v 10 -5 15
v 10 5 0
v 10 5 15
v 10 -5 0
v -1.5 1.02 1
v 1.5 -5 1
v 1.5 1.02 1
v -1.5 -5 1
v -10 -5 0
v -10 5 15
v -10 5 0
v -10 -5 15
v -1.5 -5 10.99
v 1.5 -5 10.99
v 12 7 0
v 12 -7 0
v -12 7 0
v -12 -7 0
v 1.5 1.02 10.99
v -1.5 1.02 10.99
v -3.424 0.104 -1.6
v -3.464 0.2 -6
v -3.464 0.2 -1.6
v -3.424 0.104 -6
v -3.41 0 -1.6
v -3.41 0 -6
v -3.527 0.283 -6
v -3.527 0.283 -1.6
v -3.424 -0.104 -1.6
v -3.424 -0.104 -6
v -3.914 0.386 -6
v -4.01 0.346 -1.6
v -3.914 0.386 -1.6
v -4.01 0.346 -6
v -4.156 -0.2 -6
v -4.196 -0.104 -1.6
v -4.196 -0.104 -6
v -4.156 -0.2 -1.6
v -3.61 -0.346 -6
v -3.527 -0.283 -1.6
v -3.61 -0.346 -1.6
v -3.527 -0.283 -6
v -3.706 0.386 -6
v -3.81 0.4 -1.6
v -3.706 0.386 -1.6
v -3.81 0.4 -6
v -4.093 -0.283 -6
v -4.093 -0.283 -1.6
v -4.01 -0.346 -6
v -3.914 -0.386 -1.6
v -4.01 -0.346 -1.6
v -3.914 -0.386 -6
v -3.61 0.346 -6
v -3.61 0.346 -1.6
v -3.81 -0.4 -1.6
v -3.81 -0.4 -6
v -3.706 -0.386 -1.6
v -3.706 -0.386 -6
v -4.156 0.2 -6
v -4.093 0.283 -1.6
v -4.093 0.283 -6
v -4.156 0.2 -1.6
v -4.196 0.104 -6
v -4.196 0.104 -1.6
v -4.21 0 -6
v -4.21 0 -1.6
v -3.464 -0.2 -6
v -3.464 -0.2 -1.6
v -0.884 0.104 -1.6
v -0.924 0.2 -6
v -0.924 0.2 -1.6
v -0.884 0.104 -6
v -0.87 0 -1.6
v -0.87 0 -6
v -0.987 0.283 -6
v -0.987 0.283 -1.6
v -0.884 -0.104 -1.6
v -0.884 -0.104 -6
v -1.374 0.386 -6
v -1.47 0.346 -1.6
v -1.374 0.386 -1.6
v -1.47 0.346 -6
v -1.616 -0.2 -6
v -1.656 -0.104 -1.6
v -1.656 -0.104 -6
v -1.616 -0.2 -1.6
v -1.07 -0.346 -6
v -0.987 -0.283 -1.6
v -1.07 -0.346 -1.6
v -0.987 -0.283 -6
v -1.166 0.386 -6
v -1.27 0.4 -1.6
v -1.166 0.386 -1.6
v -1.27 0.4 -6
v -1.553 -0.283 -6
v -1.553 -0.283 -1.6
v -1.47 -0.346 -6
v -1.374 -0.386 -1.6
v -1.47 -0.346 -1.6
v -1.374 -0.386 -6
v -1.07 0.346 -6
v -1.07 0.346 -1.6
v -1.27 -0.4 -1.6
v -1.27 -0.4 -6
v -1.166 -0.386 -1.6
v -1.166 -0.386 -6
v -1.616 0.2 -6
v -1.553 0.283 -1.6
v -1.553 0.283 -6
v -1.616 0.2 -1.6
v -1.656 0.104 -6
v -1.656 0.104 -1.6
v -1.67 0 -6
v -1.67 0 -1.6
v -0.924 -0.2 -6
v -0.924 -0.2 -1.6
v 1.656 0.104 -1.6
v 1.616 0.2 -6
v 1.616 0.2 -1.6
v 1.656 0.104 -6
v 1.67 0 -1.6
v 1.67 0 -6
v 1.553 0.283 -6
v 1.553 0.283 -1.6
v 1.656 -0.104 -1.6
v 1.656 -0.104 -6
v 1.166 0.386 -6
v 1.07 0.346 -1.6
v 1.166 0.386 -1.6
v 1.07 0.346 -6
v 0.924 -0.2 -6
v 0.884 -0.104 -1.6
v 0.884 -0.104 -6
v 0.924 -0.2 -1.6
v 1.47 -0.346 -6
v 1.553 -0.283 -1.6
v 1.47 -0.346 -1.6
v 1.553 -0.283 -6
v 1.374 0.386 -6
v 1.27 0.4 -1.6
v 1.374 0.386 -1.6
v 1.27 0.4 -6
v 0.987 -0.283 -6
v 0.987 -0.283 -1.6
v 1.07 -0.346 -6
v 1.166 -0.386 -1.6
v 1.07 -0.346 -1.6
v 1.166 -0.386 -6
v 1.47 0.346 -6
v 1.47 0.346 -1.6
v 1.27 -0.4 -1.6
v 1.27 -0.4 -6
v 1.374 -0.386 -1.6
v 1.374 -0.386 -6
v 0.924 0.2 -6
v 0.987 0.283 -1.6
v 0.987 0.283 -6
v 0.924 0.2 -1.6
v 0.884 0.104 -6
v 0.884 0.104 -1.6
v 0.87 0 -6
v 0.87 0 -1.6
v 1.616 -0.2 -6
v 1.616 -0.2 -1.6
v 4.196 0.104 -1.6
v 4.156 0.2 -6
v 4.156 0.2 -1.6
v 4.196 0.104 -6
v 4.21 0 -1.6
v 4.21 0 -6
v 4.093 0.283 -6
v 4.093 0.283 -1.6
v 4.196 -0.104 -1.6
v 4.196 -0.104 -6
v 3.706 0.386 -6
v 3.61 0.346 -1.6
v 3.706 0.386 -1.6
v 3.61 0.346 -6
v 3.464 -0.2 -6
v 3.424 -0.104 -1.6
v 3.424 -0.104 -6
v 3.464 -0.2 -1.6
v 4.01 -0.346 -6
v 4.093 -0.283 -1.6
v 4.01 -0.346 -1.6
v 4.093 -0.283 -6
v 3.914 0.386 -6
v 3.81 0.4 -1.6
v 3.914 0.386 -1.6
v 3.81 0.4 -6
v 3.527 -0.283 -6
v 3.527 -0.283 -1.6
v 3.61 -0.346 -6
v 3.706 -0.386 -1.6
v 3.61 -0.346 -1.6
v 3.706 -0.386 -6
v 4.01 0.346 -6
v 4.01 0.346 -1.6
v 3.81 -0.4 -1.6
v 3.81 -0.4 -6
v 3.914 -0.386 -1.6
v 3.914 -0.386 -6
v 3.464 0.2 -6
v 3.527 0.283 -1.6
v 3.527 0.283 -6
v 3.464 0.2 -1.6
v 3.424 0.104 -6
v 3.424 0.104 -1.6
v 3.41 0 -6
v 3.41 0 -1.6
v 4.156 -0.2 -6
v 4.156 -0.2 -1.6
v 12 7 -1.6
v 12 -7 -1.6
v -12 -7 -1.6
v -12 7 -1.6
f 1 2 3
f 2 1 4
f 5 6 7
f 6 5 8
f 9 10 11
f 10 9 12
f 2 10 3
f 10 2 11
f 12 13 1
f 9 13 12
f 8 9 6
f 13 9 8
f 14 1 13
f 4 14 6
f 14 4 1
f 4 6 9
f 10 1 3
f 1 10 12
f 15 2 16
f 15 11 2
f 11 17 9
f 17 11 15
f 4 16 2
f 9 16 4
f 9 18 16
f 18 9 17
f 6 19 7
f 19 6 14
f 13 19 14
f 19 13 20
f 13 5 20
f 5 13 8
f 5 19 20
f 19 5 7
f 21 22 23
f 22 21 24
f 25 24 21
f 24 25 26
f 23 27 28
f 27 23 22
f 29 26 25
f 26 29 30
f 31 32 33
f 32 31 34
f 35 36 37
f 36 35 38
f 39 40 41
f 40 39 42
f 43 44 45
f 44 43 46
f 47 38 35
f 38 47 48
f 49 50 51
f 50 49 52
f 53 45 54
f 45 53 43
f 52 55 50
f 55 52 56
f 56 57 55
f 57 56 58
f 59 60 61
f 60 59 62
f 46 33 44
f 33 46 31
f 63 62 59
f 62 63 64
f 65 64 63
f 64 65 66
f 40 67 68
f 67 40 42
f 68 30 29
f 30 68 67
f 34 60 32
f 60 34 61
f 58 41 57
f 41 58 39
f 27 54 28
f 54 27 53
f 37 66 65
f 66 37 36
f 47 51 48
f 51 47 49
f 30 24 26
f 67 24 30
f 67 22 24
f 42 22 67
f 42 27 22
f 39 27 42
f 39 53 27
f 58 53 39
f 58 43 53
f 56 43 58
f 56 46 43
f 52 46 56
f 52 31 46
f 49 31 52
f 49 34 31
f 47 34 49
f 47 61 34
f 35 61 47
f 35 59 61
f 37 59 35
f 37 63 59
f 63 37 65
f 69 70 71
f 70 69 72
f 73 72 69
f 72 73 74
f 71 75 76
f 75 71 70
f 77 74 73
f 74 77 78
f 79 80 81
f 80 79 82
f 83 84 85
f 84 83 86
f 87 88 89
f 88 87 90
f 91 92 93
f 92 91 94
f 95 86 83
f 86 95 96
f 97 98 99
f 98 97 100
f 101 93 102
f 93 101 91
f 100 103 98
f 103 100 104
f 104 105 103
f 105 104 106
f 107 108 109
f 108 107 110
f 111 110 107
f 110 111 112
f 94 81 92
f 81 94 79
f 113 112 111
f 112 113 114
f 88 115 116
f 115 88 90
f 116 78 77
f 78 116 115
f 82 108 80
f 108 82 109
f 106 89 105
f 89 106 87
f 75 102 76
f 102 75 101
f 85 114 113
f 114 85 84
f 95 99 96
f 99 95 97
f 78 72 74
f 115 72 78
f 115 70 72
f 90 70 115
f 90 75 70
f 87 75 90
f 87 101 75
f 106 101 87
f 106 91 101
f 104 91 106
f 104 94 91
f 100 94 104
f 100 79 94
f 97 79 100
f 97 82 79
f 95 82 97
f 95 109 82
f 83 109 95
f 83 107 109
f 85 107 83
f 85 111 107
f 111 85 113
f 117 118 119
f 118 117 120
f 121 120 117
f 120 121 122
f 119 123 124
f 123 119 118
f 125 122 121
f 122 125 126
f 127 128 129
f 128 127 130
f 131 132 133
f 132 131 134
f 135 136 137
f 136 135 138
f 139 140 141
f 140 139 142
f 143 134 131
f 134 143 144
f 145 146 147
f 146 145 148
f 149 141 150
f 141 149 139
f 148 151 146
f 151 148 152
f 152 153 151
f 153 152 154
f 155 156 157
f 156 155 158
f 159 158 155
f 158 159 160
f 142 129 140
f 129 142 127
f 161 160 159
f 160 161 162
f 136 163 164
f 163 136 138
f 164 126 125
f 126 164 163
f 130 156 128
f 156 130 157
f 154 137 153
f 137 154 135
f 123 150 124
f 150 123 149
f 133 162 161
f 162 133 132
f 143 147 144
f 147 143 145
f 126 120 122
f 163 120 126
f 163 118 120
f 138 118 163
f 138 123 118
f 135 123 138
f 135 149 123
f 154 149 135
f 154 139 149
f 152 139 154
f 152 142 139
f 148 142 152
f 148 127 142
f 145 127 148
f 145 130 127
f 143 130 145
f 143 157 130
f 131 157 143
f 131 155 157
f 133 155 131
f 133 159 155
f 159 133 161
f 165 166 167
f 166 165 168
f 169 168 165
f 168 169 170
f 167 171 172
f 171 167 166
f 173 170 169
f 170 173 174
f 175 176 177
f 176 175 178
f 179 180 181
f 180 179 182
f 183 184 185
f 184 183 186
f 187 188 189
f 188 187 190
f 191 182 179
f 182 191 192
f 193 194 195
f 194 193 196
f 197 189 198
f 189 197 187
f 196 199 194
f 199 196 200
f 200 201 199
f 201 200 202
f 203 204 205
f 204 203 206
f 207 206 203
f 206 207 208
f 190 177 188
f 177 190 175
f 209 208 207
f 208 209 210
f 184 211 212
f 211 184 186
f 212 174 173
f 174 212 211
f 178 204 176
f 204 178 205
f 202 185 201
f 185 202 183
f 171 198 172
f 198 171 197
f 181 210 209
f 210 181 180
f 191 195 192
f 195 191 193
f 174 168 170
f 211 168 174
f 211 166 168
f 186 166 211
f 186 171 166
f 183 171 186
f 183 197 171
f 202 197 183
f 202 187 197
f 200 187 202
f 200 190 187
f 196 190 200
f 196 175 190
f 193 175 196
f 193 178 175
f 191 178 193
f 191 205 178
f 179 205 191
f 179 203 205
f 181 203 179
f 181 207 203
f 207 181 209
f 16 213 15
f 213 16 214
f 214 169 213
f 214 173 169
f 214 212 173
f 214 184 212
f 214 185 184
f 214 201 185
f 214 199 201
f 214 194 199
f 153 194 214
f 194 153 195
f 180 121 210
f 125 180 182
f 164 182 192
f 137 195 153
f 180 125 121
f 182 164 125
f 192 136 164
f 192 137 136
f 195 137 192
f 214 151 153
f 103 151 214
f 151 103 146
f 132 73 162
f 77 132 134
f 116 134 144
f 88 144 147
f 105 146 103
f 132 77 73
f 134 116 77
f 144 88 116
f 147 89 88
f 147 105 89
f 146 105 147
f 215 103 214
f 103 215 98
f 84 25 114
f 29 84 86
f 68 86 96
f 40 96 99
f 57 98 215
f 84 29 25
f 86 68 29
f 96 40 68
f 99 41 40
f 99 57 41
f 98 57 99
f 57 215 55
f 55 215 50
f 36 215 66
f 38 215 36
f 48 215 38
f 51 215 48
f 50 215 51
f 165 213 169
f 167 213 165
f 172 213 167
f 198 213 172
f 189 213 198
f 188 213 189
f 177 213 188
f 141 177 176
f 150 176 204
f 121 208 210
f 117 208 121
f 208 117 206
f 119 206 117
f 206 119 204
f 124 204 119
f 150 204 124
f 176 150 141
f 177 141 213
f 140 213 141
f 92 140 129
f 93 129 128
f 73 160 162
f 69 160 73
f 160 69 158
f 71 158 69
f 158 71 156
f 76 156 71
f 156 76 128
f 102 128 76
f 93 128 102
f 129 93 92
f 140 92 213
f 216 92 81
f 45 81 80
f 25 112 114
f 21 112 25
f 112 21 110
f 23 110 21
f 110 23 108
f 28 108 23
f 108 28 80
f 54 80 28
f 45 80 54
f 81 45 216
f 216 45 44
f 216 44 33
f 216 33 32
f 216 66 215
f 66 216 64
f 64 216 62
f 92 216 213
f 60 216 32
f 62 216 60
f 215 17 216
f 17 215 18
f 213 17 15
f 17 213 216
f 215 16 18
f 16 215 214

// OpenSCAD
// Photo interrupter (U-slot opto) - single connected solid with fork + pins + base/PCB
// STRUCTURAL FIXES:
// 1) Add missing "photo interrupter" fork body (already present) and ensure it is attached to base with overlap
// 2) Fix floating/disconnected pins: make pins start INSIDE the base (1-2mm) and extend downward
// 3) Ensure ALL parts are in one union() and overlap slightly for watertight connectivity

// Parameters
overall_width = 20; //[10:40:1]   // X
overall_depth = 10; //[5:20:1]    // Y
overall_height = 15; //[8:30:1]   // Z (body above base)
gap_width = 3; //[1.5:8:0.5]     // X opening (slot width between legs)
gap_depth = 6; //[3:20:1]         // Y slot depth (how far the slot goes into the body)
gap_height = 10; //[5:20:1]       // Z opening height (from bottom of body upward)
bridge_thickness = 2; //[1:6:0.5] // Z thickness of top bridge above slot
leg_thickness = 2; //[1:6:0.5]    // X thickness of each fork leg

base_thickness = 2; //[1:6:0.5]   // Z base
mount_hole_diameter = 2.5; //[1.5:6:0.1]
mount_hole_spacing = 10; //[6:20:1]

pcb_thickness = 1.6; //[0.8:3.2:0.1]
pcb_margin = 2; //[1:6:0.5]
pcb_enabled = 1; //[0:1:1]

pin_count = 4; //[2:6:1]
pin_d = 0.8; //[0.4:1.2:0.05]
pin_pitch = 2.54; //[1.27:5.08:0.01]
pin_len = 6; //[3:12:0.5]
pin_row_y = 0; // centered row

overlap = 1; //[0.5:2:0.1]

// Derived / safety clamps
eps = 0.01;

body_w = max(6, overall_width);
body_d = max(4, overall_depth);
body_h = max(6, overall_height);

base_w = body_w;
base_d = body_d;

slot_w = min(gap_width, max(eps, body_w - 2*leg_thickness - eps));
slot_d = min(gap_depth, max(eps, body_d - eps));
slot_h = min(gap_height, max(eps, body_h - bridge_thickness - eps));

leg_t = min(leg_thickness, max(eps, (body_w - slot_w)/2 - eps));
bridge_t = min(bridge_thickness, max(eps, body_h - slot_h - eps));

pin_r = pin_d/2;
pins_span = (pin_count-1)*pin_pitch;
pins_x0 = -pins_span/2;

// --- Z references (base centered at Z=0) ---
base_top_z =  base_thickness/2;
base_bot_z = -base_thickness/2;

// PCB placement: overlap into base so it is fused
pcb_center_z = base_bot_z - pcb_thickness/2 + overlap;

// Fork/body placement: overlap into base so it is fused
body_center_z = base_top_z + body_h/2 - overlap;

// Pins placement (CRITICAL FIX):
// Make the TOP of each pin sit INSIDE the base by 'overlap' (not merely touching).
// This guarantees the pins are physically attached to the base (and PCB if enabled).
pins_top_z    = base_bot_z + overlap;     // inside base by overlap (since base_bot_z is bottom face)
pins_center_z = pins_top_z - pin_len/2;   // so pin extends downward from inside base

module photo_interrupter() {
  union() {

    // PCB (optional) - fused to base with overlap
    if (pcb_enabled) {
      color([0.0, 0.4, 0.2])
      translate([0, 0, pcb_center_z])
        cube([base_w + 2*pcb_margin, base_d + 2*pcb_margin, pcb_thickness], center=true);
    }

    // Base plate with mounting holes
    color([0.15, 0.2, 0.35])
    difference() {
      cube([base_w, base_d, base_thickness], center=true);

      for (sx = [-1, 1])
        translate([sx*mount_hole_spacing/2, 0, 0])
          cylinder(h=base_thickness + 2*overlap, r=mount_hole_diameter/2, center=true, $fn=48);
    }

    // Photo interrupter body (U-shaped fork) with through-slot open at the front (Y-)
    // Attached to base with overlap
    color([0.15, 0.2, 0.35])
    translate([0, 0, body_center_z])
    difference() {
      // Outer body
      cube([body_w, body_d, body_h], center=true);

      // Slot: open from bottom up to slot_h, and open from front face into the body by slot_d
      translate([0,
                 -body_d/2 + slot_d/2 + eps,          // start at front face (Y-)
                 -body_h/2 + slot_h/2 - eps])         // start at bottom of body
        cube([slot_w, slot_d + 2*eps, slot_h + 2*overlap], center=true);
    }

    // Leads/pins - attached by embedding their top into the base by 'overlap'
    color([0.75, 0.75, 0.75])
    for (i = [0:pin_count-1]) {
      x = pins_x0 + i*pin_pitch;
      translate([x, pin_row_y, pins_center_z])
        cylinder(h=pin_len, r=pin_r, center=true, $fn=24);
    }
  }
}

photo_interrupter();
